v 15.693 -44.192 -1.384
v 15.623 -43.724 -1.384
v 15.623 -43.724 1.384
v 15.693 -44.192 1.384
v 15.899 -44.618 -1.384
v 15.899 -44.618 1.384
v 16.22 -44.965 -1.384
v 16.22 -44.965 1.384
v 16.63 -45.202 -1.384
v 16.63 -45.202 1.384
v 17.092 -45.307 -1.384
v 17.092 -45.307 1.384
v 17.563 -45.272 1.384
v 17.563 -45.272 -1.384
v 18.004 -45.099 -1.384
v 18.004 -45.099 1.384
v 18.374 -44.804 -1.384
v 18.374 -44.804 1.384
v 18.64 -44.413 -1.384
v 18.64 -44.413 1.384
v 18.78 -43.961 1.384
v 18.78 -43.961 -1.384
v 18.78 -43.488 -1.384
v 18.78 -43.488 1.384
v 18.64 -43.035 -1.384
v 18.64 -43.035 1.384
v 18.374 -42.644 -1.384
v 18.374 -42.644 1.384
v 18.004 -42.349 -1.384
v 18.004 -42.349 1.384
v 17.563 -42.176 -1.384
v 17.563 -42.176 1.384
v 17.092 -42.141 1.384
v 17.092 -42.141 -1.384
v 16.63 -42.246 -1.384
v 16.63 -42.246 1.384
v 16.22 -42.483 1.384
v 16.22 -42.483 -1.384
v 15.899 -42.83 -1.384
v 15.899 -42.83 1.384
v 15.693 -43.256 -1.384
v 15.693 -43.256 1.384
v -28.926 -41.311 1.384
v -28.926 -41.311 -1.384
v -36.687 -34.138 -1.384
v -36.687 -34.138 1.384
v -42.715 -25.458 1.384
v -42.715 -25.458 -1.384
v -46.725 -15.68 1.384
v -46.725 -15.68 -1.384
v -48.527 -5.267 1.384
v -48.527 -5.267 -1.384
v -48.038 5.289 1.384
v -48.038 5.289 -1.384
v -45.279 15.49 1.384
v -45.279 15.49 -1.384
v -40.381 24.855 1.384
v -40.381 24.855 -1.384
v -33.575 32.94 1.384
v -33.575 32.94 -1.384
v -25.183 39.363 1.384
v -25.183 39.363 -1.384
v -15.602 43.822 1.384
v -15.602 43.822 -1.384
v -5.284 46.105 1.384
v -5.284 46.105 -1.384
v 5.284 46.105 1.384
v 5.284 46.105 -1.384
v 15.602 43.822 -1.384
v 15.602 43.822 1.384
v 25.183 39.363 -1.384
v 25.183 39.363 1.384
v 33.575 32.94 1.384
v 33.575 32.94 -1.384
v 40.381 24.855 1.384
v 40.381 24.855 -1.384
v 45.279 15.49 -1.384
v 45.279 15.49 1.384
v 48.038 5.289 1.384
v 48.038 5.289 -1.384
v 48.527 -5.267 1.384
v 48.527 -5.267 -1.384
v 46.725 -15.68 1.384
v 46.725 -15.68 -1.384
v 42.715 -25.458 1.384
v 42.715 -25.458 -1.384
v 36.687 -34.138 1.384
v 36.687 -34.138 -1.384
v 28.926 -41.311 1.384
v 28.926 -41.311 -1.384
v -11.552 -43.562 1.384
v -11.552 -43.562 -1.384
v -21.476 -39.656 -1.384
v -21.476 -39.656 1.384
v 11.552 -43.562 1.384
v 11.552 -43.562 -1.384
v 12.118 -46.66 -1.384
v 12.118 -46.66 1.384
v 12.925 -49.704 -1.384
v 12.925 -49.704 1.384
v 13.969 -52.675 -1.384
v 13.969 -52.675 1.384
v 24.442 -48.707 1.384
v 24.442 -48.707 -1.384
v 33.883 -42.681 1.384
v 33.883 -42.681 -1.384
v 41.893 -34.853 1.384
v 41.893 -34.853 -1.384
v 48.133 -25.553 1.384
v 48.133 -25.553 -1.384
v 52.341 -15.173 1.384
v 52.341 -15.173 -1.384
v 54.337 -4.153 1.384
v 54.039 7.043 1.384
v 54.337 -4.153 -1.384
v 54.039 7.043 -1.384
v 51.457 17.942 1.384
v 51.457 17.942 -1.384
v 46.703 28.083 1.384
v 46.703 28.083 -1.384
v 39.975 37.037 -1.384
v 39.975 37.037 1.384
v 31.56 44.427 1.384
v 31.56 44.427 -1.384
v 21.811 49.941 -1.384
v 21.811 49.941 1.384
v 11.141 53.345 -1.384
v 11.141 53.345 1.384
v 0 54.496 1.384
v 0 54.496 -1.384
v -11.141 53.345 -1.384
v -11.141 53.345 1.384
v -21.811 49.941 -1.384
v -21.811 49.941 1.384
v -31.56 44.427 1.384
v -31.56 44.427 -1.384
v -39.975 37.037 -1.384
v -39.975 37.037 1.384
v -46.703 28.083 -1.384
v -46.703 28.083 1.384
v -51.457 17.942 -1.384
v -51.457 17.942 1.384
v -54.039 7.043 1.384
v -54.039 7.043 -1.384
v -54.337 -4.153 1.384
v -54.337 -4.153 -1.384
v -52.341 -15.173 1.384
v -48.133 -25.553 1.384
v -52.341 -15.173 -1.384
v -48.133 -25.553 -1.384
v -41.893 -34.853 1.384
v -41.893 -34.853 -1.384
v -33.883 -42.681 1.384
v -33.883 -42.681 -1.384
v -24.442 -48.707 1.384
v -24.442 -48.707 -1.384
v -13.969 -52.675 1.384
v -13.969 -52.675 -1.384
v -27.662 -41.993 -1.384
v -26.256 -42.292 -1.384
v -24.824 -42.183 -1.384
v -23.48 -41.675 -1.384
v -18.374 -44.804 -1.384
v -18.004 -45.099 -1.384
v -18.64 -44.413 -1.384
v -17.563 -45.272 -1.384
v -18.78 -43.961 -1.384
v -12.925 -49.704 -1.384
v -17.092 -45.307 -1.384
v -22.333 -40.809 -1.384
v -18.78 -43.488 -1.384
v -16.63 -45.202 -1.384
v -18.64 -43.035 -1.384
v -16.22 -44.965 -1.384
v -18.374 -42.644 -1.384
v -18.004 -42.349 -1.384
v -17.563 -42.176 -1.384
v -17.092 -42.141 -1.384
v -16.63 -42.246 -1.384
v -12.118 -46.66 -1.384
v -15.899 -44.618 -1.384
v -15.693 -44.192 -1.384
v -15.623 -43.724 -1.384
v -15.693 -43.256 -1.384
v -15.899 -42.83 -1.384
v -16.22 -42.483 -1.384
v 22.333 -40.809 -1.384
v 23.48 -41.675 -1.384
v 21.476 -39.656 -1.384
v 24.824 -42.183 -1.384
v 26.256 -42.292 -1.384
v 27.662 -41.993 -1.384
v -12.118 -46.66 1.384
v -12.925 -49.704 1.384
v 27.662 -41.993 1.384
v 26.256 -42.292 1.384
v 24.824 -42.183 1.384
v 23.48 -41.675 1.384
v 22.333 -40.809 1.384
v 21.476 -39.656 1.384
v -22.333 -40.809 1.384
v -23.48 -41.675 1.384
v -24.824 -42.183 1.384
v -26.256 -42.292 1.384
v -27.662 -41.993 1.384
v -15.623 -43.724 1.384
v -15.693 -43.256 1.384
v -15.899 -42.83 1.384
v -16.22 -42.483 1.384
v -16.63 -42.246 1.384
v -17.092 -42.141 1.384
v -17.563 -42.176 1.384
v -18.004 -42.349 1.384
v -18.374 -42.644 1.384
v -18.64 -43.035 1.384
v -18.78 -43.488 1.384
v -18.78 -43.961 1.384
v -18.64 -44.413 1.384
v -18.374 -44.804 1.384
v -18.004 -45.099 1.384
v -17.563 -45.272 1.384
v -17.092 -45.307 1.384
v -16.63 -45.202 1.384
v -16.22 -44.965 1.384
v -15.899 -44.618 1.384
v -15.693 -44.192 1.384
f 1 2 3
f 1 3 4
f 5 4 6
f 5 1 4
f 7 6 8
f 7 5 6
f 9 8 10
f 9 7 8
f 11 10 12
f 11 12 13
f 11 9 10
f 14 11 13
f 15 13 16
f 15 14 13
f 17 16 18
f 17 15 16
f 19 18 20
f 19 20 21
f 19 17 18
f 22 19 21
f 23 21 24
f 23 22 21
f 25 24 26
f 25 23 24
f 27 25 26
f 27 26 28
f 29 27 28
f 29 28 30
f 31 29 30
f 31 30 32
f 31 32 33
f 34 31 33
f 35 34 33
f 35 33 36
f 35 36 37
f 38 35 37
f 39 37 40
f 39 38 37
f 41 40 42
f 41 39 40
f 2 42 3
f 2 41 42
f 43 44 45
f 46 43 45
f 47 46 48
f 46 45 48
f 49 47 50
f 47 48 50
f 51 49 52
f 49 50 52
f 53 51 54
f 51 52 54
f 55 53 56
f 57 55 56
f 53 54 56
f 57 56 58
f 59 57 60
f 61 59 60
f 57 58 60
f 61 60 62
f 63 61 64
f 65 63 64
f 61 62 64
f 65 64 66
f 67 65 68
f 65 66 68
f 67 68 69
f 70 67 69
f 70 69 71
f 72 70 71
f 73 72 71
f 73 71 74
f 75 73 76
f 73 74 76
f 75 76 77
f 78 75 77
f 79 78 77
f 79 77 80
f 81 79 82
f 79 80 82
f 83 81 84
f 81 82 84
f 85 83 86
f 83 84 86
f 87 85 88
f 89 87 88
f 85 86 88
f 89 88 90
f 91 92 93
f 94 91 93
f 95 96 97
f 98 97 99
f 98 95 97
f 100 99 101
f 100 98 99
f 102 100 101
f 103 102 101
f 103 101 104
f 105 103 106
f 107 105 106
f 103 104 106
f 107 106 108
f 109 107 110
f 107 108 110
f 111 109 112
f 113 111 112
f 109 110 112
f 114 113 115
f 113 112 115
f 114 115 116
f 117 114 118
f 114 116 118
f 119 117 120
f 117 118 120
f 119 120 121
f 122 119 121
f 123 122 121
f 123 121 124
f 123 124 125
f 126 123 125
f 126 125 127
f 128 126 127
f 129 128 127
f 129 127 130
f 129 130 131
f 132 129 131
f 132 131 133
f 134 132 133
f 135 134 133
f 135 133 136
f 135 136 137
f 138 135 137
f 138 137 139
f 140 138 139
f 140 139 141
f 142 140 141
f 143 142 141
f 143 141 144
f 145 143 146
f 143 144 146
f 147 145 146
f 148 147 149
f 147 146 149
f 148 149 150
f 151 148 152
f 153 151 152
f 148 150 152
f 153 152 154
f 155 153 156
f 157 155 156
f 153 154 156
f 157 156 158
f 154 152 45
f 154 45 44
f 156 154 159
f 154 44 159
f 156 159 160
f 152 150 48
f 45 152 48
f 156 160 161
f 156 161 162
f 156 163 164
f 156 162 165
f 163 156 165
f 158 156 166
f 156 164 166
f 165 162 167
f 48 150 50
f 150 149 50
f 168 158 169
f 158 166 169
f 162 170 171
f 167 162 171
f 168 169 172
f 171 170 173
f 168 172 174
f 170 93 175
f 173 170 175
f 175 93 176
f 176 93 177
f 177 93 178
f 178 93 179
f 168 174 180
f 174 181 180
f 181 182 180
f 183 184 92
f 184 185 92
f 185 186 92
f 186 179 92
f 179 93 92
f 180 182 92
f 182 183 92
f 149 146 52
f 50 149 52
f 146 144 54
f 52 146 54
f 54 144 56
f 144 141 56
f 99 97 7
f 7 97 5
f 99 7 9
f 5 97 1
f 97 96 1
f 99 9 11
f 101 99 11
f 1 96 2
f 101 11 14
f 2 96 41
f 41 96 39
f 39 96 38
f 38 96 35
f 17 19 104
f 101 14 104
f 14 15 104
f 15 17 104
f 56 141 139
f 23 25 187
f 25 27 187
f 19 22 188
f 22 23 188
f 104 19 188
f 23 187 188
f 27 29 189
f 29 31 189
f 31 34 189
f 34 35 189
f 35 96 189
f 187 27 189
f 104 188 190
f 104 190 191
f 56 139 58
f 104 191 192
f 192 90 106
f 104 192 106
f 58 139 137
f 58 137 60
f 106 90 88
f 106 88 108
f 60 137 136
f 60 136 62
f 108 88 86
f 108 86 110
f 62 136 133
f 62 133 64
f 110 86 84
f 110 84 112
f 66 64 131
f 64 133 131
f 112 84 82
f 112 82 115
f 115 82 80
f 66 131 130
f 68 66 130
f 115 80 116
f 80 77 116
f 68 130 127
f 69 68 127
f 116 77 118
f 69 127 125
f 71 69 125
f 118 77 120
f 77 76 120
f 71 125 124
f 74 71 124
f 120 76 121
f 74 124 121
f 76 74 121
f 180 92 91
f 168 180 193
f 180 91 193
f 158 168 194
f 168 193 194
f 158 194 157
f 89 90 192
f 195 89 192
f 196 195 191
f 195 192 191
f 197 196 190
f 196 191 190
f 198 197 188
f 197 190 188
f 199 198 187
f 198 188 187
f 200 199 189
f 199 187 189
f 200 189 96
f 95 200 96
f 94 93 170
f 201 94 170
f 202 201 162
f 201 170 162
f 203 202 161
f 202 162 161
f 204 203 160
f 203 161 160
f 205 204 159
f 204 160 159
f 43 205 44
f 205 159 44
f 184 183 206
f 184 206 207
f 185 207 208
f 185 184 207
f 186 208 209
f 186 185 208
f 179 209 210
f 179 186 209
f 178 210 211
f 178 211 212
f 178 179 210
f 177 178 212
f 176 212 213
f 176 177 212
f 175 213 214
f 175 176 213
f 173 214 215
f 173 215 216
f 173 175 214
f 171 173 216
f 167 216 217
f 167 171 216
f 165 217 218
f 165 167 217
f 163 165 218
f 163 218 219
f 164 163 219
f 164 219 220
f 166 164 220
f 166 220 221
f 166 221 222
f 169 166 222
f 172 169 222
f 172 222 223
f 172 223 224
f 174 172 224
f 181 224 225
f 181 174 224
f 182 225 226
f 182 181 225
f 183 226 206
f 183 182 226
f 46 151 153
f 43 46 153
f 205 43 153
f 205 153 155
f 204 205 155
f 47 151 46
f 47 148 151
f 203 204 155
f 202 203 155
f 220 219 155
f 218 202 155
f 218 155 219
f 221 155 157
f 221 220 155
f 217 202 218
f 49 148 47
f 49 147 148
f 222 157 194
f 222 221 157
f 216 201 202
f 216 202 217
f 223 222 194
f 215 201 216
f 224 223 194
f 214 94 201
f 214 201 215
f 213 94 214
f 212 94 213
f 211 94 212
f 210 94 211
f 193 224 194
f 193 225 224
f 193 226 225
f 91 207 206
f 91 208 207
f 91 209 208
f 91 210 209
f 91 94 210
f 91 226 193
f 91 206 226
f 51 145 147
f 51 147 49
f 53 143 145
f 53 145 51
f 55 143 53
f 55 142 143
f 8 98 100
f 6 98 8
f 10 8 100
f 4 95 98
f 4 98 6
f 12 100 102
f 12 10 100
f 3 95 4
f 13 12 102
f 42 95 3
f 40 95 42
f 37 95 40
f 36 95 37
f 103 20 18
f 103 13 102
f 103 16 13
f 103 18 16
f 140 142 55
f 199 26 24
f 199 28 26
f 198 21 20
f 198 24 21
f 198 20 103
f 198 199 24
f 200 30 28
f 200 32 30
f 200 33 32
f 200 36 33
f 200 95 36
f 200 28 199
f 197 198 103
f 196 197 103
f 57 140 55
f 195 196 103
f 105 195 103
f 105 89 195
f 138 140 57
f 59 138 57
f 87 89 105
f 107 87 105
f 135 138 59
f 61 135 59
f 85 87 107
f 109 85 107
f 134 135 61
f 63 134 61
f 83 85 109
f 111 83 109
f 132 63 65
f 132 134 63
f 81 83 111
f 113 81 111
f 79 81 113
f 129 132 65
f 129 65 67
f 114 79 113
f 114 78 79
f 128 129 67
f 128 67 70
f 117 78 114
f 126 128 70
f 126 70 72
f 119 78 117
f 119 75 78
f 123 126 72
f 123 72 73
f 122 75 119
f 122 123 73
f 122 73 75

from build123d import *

# Parameters (mm, degrees)
BOSS_EXTRUDE1_DEPTH      = 1.3843
BOSS_EXTRUDE1_DEPTH_BACK = 1.3843
SKETCH3_R                = 1.5875
CUT_EXTRUDE1_DEPTH       = 78.080989378


with BuildPart() as part:
    # Sketch3 → Boss-Extrude1 (new, two sides: drawn at the far end of the back side and taken through both)
    with BuildSketch(Plane.XY.offset(-BOSS_EXTRUDE1_DEPTH_BACK)):
        with BuildLine():
            Line((-13.67380138, -52.752331459), (-11.3157, -43.654982291))
            Line((-11.3157, -43.654982291), (-21.476062034, -39.655785263))
            ThreePointArc((-21.476062034, -39.655785263), (-24.823734092, -42.182520656), (-28.926434765, -41.311230152))
            ThreePointArc((-28.926434765, -41.311230152), (0, 46.3931), (28.926434765, -41.311230152))
            ThreePointArc((28.926434765, -41.311230152), (24.823734092, -42.182520656), (21.476062034, -39.655785263))
            Line((21.476062034, -39.655785263), (11.3157, -43.654982291))
            Line((11.3157, -43.654982291), (13.67380138, -52.752331459))
            ThreePointArc((13.67380138, -52.752331459), (0, 54.4957), (-13.67380138, -52.752331459))
        make_face()
        with Locations((-17.210160294, -43.724142128)):
            Circle(SKETCH3_R, mode=Mode.SUBTRACT)
        with Locations(Location((17.210160294, -43.724142128, 0), (0, 0, 180))):
            Circle(SKETCH3_R, mode=Mode.SUBTRACT)
    extrude(amount=BOSS_EXTRUDE1_DEPTH + BOSS_EXTRUDE1_DEPTH_BACK)

    # Sketch4 → Cut-Extrude1 (cut, symmetric)
    with BuildSketch(Plane.XY):
        with BuildLine():
            Line((-13.968711324, -52.675007569), (-13.968711324, -66.643718893))
            Line((-13.968711324, -66.643718893), (0, -66.643718893))
            Line((0, -66.643718893), (0, -54.4957))
            Line((0, -54.4957), (0, -43.561952925))
            Line((0, -43.561952925), (-11.552050454, -43.561952925))
            ThreePointArc((-11.552050454, -43.561952925), (-12.491783859, -48.189708607), (-13.968711324, -52.675007569))
        make_face()
    cut_extrude1 = extrude(amount=CUT_EXTRUDE1_DEPTH, both=True, mode=Mode.SUBTRACT)

    # Mirror1: Cut-Extrude1 across plane
    add(cut_extrude1.mirror(Plane(origin=(0, 0, 0), x_dir=(0, 0, 1), z_dir=(1, 0, 0))), mode=Mode.SUBTRACT)


solid = part.part
